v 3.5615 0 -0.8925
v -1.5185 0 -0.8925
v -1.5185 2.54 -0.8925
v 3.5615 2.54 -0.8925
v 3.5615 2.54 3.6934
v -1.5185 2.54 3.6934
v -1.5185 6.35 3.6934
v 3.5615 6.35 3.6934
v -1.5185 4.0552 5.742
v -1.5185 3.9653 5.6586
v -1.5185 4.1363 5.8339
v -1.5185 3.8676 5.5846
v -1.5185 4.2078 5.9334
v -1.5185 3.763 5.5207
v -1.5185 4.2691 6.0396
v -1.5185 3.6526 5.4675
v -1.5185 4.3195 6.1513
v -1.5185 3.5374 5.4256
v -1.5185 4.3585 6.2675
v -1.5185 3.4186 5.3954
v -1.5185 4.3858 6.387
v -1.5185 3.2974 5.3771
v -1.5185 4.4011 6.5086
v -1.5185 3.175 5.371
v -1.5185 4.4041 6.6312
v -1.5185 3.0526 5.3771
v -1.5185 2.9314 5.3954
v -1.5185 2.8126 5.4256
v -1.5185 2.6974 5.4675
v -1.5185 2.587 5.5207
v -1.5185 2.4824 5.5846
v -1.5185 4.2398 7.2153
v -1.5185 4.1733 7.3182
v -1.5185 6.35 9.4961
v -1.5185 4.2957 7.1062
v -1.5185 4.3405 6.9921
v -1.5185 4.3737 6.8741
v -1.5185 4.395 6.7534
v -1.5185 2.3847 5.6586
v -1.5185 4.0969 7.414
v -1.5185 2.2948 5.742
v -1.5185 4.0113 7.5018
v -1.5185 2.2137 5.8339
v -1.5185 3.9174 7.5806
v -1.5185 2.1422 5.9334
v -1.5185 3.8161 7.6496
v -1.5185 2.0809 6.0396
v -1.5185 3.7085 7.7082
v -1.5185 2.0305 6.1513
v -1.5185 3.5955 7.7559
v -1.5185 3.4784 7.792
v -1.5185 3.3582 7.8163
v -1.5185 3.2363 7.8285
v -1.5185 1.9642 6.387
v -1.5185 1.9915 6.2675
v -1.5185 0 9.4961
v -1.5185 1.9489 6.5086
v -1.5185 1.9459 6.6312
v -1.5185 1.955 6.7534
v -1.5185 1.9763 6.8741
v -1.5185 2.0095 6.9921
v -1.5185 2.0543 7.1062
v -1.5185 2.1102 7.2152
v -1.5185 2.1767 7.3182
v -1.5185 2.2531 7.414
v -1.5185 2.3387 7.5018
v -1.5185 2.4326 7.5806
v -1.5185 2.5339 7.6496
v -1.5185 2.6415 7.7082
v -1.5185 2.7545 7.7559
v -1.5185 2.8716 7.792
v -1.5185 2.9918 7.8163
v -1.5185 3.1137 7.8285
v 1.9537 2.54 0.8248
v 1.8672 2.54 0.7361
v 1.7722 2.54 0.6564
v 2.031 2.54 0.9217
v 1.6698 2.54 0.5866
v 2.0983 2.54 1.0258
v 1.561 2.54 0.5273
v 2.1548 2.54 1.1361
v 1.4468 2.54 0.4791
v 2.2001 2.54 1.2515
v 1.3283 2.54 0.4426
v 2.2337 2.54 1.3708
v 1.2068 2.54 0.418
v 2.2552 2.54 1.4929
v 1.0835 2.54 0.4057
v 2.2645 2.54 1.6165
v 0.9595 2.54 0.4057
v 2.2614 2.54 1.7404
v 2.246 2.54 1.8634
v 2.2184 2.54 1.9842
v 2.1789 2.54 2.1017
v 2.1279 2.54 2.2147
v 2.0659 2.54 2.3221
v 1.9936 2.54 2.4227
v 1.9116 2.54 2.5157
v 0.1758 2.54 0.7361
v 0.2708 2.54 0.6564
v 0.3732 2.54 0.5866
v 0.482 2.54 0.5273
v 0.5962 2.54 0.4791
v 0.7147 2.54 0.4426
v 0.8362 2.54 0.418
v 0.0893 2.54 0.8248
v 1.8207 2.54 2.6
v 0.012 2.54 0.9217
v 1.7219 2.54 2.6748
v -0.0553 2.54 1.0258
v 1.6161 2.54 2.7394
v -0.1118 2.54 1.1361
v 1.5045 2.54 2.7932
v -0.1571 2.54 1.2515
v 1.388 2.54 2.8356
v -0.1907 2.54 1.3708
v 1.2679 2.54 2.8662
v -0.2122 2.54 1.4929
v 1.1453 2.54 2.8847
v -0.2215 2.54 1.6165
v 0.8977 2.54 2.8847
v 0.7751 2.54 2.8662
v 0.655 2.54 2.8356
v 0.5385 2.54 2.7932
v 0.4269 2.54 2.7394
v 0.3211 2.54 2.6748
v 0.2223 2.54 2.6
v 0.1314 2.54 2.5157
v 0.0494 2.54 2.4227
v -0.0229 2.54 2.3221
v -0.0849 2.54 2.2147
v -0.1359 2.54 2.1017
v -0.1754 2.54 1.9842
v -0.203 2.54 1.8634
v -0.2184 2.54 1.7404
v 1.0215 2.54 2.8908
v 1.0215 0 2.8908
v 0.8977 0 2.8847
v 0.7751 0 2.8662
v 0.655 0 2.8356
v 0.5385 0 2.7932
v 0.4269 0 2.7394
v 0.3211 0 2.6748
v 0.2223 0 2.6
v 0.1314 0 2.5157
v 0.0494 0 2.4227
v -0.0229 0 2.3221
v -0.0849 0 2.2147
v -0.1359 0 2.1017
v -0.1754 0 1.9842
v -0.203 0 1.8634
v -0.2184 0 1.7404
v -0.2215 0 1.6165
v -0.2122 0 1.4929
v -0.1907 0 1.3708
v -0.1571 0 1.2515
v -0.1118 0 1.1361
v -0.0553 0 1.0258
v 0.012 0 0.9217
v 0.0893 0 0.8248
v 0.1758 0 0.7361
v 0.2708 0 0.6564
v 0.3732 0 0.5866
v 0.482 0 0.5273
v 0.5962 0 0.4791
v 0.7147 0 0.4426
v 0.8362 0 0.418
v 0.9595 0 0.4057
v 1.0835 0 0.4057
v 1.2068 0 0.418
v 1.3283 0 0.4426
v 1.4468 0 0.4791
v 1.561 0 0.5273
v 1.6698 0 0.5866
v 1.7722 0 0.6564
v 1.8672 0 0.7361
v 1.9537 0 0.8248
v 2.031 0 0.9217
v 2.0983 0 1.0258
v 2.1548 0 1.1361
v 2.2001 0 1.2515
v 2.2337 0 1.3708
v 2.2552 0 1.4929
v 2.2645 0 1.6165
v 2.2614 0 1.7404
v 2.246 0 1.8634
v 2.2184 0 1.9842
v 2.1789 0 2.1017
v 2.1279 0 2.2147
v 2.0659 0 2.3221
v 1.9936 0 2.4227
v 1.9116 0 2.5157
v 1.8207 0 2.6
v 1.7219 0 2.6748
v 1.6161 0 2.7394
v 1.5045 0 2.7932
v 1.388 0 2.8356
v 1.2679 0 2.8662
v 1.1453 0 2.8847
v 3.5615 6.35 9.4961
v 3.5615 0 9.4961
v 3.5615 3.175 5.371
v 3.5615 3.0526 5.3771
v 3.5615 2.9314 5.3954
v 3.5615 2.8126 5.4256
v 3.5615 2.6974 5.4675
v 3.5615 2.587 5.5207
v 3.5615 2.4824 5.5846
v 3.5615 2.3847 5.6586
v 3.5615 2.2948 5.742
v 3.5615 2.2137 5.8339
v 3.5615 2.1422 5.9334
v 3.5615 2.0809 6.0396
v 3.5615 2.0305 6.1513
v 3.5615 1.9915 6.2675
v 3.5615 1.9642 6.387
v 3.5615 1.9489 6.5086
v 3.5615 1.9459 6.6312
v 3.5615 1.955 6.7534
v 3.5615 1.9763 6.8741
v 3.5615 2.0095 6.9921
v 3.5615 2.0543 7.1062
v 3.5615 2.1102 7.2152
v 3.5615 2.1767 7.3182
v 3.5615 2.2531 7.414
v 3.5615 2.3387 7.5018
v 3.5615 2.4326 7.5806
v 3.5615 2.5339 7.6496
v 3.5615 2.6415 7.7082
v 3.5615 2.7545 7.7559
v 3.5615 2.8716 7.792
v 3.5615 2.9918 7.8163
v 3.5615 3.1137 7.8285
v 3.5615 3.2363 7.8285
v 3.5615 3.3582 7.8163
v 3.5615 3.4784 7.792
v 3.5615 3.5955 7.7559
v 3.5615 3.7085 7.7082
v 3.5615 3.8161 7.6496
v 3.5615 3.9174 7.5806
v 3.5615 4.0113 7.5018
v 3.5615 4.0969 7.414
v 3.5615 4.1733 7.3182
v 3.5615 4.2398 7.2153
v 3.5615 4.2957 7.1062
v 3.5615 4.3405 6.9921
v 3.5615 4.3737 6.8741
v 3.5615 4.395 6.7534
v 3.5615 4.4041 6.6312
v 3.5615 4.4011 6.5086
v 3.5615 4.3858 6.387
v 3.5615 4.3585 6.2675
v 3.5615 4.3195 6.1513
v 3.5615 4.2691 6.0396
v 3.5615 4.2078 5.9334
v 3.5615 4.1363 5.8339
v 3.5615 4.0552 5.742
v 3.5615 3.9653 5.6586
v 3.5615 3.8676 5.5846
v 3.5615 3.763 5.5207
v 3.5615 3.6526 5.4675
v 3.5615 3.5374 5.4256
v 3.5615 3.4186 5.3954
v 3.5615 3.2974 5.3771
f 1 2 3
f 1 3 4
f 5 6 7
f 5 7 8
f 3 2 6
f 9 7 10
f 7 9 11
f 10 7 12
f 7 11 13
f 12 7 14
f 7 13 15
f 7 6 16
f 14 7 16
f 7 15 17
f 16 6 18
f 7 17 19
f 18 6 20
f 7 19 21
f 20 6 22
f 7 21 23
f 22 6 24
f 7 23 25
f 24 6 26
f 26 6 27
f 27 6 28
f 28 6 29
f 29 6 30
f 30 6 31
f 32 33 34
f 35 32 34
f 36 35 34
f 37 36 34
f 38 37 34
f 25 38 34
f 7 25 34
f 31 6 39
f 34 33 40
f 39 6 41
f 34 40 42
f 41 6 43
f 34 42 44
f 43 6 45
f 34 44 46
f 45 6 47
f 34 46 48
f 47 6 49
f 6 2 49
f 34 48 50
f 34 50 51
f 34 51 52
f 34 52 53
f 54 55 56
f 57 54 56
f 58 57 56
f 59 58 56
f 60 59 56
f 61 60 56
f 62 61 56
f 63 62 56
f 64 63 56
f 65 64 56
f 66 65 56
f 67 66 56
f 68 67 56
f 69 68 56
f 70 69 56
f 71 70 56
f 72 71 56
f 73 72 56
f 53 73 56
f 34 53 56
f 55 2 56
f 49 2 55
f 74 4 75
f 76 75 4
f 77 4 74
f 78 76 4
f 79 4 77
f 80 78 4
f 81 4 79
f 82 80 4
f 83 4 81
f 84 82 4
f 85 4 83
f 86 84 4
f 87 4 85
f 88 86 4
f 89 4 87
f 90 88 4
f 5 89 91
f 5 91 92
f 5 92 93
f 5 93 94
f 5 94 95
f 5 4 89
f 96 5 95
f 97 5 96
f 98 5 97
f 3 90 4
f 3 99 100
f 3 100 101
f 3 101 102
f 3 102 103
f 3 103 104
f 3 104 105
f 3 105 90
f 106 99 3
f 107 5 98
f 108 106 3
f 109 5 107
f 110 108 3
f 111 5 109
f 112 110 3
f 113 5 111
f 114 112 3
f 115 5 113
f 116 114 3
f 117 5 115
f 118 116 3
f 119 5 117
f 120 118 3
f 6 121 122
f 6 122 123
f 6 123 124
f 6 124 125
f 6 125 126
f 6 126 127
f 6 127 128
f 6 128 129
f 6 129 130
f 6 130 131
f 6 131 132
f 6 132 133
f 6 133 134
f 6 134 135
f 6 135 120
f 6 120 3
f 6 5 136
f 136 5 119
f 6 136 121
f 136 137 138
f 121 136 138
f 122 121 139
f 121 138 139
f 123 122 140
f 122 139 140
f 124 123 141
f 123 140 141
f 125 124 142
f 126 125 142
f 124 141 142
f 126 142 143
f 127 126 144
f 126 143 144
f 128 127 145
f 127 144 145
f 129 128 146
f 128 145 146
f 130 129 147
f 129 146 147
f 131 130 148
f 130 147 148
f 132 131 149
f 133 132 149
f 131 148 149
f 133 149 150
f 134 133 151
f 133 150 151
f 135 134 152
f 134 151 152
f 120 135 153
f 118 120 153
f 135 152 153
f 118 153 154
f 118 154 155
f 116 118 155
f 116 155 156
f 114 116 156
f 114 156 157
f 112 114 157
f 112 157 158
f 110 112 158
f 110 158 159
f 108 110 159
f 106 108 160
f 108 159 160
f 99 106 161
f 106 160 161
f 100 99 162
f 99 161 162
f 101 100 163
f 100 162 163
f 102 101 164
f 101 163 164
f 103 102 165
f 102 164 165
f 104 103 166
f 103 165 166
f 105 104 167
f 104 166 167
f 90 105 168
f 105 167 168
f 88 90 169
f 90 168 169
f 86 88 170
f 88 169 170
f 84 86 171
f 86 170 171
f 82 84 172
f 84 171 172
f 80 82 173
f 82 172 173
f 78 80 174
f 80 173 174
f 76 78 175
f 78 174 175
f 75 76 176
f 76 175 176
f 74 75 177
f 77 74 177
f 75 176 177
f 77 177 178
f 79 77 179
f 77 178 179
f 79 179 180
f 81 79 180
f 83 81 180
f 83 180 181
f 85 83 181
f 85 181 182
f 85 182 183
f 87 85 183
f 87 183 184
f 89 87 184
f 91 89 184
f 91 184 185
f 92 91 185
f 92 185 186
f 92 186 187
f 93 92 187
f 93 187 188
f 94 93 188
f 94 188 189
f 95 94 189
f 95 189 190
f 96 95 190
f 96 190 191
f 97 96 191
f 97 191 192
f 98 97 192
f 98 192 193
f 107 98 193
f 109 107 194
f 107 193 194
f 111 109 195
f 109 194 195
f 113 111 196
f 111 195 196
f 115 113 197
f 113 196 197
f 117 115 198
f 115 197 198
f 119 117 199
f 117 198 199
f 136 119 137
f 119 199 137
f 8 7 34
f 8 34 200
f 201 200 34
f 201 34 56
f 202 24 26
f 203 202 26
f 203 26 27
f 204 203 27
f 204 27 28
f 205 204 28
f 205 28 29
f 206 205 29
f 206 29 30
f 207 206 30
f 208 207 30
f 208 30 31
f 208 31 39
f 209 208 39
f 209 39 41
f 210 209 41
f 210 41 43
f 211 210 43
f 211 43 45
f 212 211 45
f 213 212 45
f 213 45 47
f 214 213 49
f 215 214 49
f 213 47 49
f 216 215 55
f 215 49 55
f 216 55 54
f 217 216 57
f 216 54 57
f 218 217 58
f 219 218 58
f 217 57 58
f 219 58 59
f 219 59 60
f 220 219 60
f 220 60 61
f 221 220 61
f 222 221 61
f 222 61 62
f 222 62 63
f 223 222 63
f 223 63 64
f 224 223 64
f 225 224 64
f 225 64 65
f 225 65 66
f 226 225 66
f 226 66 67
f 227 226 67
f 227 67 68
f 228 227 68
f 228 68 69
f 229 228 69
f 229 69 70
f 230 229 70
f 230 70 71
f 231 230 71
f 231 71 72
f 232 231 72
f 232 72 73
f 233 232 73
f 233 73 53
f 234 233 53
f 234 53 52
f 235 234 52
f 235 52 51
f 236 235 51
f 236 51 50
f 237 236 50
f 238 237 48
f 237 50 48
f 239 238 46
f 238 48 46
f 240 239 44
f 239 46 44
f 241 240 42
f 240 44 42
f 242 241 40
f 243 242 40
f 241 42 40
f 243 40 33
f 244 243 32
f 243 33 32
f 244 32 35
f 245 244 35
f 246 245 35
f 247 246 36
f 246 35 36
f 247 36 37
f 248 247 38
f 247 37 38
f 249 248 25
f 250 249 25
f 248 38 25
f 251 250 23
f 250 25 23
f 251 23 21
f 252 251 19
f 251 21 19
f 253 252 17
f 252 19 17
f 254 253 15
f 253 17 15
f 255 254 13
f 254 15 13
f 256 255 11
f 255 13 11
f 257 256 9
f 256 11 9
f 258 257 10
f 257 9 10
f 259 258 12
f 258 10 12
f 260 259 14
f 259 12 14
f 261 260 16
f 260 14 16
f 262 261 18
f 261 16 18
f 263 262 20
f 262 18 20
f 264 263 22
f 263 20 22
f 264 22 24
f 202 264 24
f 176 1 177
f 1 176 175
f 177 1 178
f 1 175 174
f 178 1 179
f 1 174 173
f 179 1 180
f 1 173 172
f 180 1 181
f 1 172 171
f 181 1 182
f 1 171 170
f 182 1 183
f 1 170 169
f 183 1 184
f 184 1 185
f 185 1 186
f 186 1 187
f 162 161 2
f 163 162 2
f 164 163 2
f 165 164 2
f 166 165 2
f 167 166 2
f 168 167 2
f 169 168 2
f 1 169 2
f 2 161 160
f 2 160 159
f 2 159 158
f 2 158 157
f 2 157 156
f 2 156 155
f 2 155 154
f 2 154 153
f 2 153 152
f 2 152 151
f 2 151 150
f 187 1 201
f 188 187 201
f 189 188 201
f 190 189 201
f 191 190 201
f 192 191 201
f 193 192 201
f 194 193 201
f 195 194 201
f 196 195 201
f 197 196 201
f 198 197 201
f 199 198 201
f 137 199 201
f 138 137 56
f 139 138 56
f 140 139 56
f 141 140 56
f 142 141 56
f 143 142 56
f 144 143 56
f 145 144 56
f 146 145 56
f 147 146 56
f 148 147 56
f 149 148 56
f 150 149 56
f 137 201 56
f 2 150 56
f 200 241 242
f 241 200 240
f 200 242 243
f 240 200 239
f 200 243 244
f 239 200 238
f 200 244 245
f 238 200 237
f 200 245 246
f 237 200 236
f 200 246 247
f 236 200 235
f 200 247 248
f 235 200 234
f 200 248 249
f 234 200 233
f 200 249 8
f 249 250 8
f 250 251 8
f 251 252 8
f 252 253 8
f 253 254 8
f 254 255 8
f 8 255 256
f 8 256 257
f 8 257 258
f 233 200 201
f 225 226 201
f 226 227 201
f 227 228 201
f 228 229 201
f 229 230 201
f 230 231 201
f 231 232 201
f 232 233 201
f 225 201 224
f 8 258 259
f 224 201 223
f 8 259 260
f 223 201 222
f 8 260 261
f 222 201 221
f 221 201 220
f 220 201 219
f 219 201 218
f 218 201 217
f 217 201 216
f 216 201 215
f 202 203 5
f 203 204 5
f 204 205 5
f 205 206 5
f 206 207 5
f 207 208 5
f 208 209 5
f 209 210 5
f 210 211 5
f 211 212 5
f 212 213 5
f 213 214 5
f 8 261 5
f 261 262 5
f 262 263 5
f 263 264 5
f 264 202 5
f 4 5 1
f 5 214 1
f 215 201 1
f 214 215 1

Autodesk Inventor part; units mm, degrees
ref_plane "YZ Plane" through (0, 0, 0) normal (1, 0, 0) x (0, 1, 0)
ref_plane "XZ Plane" through (0, 0, 0) normal (0, 1, 0) x (-1, 0, 0)
ref_plane "XY Plane" through (0, 0, 0) normal (0, 0, 1) x (1, 0, 0)
sketch "Sketch20" plane through (0, 0, 0) normal (0, 1, 0) x (-1, 0, 0)
  line L0 (1.5185, -0.8925) -> (-3.5615, -0.8925)
  line L1 (-3.5615, -0.8925) -> (-3.5615, 11.8075)
  line L2 (-3.5615, 11.8075) -> (1.5185, 11.8075)
  line L3 (1.5185, 11.8075) -> (1.5185, -0.8925)
  line L4 (1.5185, 4.9634) -> (-3.5615, 4.9634)
  point P0 (0, 0)
  dimension "d56" = 5.08
  dimension "d57" = 12.7
extrude "Extrusion7" add sketch "Sketch20" along normal blind 2.54 contours L0 L1 L4 L3
extrude "Extrusion8" add sketch "Sketch20" along normal blind 6.35 contours L4 L1 L2 L3
sketch "Sketch21" plane through (0, 2.54, 0) normal (0, 1, 0) x (1, 0, 0)
  line L0 (3.5615, 0.8925) -> (-1.5185, 0.8925) projected
  line L1 (-1.5185, 0.8925) -> (-1.5185, -4.9634) projected
  point P0 (0, 0)
  point P1 (1.0215, -1.6475)
  dimension "d62" = 2.54
  dimension "d63" = 2.54
hole "Hole5" at (1.0215, 2.54, 1.6475) direction (0, -1, 0) diameter 2.4867 end through all
sketch "Sketch22" plane through (3.5615, 0, -0.8925) normal (1, 0, 0) x (0, 0, -1)
  line L0 (-12.7, 6.35) -> (-5.8558, 6.35) projected
  line L1 (-12.7, 0) -> (-12.7, 6.35) projected
  point P0 (-0.8925, 0)
  point P1 (-7.493, 3.175)
  dimension "d71" = 3.175
  dimension "d72" = 5.207
hole "Hole6" at (3.5615, 3.175, 6.6005) direction (-1, 0, 0) diameter 2.459 end through all thread size "M3x0.5" class "6H" standard "ISO Metric profile"
sketch "Sketch23" plane through (0, 2.54, 0) normal (0, 1, 0) x (1, 0, 0)
  line L0 (-1.5185, 0.8925) -> (-1.5185, -4.9634) projected
  line L1 (-1.5185, -4.9634) -> (-1.5185, -3.6934)
  line L2 (-1.5185, -3.6934) -> (3.5615, -3.6934)
  line L3 (3.5615, -4.9634) -> (3.5615, 0.8925) projected
  line L4 (3.5615, -3.6934) -> (3.5615, -4.9634)
  line L5 (3.5615, -11.8075) -> (3.5615, 0.8925) projected
  line L6 (3.5615, -4.9634) -> (-1.5185, -4.9634) projected
  line L7 (-1.5185, -4.9634) -> (3.5615, -4.9634)
  point P0 (0, 0)
  dimension "d80" = 1.27
extrude "Extrusion9" add sketch "Sketch23" along normal blind 3.81
sketch "Sketch25" plane through (3.5615, 0, -0.8925) normal (1, 0, 0) x (0, 0, -1)
  circle A0 centre (-7.493, 3.175) radius 1.2295 projected
  line L0 (-7.493, 3.175) -> (-10.3886, 3.175)
  line L1 (-4.5858, 6.35) -> (-12.7, 6.35) projected
  line L2 (-12.7, 0) -> (0, 0) projected
  line L3 (-12.7, 6.35) -> (-10.3886, 6.35)
  line L4 (-10.3886, 6.35) -> (-10.3886, 0)
  line L5 (-10.3886, 0) -> (-12.7, 0)
  line L6 (-12.7, 0) -> (-12.7, 6.35)
  point P0 (-0.8925, 0)
  dimension "d83" = 2.8956
extrude "Extrusion10" cut sketch "Sketch25" against normal blind 25.4 contours L4 L2 L6 L1
properties part number "filament holders"
